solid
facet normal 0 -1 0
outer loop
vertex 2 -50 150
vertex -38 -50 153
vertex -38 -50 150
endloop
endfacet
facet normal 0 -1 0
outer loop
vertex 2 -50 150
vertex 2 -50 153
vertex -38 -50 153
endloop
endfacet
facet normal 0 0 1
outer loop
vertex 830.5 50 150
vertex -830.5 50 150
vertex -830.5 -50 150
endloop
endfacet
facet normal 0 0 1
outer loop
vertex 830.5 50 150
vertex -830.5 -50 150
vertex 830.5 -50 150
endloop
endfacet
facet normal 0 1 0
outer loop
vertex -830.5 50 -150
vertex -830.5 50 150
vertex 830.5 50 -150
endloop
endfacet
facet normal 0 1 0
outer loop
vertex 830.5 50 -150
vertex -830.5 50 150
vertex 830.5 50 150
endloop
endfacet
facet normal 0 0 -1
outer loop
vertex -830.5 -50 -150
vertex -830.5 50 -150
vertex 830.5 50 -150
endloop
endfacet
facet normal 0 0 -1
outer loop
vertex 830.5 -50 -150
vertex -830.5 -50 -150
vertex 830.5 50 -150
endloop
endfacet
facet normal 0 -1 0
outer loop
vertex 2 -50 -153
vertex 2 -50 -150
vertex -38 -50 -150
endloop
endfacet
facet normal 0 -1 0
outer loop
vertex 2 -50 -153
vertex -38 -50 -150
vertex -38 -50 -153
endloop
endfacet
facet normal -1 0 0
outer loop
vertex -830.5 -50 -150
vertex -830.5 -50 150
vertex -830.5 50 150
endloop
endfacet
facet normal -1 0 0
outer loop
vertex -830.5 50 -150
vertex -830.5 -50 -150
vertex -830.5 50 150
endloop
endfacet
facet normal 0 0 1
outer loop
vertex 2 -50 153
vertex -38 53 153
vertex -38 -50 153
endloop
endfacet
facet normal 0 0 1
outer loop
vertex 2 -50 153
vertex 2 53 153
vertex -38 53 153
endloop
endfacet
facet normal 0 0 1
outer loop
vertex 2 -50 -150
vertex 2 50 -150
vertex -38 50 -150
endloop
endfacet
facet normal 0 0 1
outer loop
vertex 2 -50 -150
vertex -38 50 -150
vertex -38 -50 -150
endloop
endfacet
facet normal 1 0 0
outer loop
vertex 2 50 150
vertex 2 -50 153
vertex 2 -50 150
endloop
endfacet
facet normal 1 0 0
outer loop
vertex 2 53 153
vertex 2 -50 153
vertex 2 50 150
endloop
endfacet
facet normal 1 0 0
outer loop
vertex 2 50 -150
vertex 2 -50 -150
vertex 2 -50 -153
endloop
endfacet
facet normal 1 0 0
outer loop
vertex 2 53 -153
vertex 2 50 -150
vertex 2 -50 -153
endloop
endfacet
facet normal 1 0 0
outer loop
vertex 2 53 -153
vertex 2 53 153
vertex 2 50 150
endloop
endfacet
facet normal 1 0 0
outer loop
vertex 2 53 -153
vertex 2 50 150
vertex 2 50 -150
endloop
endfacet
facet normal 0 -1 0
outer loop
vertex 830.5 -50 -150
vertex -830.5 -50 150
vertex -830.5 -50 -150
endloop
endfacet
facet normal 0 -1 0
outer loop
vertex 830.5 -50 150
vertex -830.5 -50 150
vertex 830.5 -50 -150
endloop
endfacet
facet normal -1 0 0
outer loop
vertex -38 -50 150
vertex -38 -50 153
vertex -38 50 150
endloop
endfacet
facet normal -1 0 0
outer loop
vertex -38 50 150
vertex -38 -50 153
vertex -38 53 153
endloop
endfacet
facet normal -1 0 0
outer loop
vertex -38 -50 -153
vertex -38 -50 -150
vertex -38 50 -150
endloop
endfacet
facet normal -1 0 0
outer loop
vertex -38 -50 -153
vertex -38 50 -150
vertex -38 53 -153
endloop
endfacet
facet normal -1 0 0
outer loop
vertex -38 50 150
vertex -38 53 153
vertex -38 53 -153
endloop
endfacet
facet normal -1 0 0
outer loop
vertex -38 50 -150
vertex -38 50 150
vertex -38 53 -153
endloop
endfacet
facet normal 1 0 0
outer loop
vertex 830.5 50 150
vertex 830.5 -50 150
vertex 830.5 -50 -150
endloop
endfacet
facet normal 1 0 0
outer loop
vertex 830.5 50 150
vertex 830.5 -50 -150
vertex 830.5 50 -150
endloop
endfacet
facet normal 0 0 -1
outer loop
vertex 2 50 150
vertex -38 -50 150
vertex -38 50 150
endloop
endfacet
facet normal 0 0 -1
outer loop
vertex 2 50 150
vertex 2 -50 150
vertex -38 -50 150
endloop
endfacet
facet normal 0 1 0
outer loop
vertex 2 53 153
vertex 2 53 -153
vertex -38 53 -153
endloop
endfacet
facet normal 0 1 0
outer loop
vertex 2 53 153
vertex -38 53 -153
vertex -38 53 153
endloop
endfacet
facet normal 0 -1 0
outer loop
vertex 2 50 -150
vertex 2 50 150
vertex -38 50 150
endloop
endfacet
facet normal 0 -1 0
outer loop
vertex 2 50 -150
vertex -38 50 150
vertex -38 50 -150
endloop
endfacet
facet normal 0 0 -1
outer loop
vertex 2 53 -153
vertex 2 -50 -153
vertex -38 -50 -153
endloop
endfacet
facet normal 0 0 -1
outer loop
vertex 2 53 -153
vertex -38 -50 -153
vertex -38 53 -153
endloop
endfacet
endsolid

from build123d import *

# Parameters (mm, degrees)
BOSS_EXTRUDE1_DEPTH      = 150
BOSS_EXTRUDE1_DEPTH_BACK = 150
SKETCH1_W                = 1661
SKETCH1_H                = 100
BOSS_EXTRUDE2_DEPTH      = 2
BOSS_EXTRUDE2_DEPTH_BACK = 38


with BuildPart() as part:
    # Sketch1 → Boss-Extrude1 (new, two sides: drawn at the far end of the back side and taken through both)
    with BuildSketch(Plane.XY.offset(-BOSS_EXTRUDE1_DEPTH_BACK)):
        Rectangle(SKETCH1_W, SKETCH1_H)
    extrude(amount=BOSS_EXTRUDE1_DEPTH + BOSS_EXTRUDE1_DEPTH_BACK)


with BuildPart() as body_2:
    # Sketch2 → Boss-Extrude2 (new, two sides: drawn at the far end of the back side and taken through both)
    with BuildSketch(Plane(origin=(0, 0, 0), x_dir=(0, 0, -1), z_dir=(1, 0, 0)).offset(-BOSS_EXTRUDE2_DEPTH_BACK)):
        Polygon((-150, -50), (-150, 50), (150, 50), (150, -50), (153, -50), (153, 53), (-153, 53), (-153, -50), align=None)
    extrude(amount=BOSS_EXTRUDE2_DEPTH + BOSS_EXTRUDE2_DEPTH_BACK)


solid = Compound([part.part, body_2.part])
